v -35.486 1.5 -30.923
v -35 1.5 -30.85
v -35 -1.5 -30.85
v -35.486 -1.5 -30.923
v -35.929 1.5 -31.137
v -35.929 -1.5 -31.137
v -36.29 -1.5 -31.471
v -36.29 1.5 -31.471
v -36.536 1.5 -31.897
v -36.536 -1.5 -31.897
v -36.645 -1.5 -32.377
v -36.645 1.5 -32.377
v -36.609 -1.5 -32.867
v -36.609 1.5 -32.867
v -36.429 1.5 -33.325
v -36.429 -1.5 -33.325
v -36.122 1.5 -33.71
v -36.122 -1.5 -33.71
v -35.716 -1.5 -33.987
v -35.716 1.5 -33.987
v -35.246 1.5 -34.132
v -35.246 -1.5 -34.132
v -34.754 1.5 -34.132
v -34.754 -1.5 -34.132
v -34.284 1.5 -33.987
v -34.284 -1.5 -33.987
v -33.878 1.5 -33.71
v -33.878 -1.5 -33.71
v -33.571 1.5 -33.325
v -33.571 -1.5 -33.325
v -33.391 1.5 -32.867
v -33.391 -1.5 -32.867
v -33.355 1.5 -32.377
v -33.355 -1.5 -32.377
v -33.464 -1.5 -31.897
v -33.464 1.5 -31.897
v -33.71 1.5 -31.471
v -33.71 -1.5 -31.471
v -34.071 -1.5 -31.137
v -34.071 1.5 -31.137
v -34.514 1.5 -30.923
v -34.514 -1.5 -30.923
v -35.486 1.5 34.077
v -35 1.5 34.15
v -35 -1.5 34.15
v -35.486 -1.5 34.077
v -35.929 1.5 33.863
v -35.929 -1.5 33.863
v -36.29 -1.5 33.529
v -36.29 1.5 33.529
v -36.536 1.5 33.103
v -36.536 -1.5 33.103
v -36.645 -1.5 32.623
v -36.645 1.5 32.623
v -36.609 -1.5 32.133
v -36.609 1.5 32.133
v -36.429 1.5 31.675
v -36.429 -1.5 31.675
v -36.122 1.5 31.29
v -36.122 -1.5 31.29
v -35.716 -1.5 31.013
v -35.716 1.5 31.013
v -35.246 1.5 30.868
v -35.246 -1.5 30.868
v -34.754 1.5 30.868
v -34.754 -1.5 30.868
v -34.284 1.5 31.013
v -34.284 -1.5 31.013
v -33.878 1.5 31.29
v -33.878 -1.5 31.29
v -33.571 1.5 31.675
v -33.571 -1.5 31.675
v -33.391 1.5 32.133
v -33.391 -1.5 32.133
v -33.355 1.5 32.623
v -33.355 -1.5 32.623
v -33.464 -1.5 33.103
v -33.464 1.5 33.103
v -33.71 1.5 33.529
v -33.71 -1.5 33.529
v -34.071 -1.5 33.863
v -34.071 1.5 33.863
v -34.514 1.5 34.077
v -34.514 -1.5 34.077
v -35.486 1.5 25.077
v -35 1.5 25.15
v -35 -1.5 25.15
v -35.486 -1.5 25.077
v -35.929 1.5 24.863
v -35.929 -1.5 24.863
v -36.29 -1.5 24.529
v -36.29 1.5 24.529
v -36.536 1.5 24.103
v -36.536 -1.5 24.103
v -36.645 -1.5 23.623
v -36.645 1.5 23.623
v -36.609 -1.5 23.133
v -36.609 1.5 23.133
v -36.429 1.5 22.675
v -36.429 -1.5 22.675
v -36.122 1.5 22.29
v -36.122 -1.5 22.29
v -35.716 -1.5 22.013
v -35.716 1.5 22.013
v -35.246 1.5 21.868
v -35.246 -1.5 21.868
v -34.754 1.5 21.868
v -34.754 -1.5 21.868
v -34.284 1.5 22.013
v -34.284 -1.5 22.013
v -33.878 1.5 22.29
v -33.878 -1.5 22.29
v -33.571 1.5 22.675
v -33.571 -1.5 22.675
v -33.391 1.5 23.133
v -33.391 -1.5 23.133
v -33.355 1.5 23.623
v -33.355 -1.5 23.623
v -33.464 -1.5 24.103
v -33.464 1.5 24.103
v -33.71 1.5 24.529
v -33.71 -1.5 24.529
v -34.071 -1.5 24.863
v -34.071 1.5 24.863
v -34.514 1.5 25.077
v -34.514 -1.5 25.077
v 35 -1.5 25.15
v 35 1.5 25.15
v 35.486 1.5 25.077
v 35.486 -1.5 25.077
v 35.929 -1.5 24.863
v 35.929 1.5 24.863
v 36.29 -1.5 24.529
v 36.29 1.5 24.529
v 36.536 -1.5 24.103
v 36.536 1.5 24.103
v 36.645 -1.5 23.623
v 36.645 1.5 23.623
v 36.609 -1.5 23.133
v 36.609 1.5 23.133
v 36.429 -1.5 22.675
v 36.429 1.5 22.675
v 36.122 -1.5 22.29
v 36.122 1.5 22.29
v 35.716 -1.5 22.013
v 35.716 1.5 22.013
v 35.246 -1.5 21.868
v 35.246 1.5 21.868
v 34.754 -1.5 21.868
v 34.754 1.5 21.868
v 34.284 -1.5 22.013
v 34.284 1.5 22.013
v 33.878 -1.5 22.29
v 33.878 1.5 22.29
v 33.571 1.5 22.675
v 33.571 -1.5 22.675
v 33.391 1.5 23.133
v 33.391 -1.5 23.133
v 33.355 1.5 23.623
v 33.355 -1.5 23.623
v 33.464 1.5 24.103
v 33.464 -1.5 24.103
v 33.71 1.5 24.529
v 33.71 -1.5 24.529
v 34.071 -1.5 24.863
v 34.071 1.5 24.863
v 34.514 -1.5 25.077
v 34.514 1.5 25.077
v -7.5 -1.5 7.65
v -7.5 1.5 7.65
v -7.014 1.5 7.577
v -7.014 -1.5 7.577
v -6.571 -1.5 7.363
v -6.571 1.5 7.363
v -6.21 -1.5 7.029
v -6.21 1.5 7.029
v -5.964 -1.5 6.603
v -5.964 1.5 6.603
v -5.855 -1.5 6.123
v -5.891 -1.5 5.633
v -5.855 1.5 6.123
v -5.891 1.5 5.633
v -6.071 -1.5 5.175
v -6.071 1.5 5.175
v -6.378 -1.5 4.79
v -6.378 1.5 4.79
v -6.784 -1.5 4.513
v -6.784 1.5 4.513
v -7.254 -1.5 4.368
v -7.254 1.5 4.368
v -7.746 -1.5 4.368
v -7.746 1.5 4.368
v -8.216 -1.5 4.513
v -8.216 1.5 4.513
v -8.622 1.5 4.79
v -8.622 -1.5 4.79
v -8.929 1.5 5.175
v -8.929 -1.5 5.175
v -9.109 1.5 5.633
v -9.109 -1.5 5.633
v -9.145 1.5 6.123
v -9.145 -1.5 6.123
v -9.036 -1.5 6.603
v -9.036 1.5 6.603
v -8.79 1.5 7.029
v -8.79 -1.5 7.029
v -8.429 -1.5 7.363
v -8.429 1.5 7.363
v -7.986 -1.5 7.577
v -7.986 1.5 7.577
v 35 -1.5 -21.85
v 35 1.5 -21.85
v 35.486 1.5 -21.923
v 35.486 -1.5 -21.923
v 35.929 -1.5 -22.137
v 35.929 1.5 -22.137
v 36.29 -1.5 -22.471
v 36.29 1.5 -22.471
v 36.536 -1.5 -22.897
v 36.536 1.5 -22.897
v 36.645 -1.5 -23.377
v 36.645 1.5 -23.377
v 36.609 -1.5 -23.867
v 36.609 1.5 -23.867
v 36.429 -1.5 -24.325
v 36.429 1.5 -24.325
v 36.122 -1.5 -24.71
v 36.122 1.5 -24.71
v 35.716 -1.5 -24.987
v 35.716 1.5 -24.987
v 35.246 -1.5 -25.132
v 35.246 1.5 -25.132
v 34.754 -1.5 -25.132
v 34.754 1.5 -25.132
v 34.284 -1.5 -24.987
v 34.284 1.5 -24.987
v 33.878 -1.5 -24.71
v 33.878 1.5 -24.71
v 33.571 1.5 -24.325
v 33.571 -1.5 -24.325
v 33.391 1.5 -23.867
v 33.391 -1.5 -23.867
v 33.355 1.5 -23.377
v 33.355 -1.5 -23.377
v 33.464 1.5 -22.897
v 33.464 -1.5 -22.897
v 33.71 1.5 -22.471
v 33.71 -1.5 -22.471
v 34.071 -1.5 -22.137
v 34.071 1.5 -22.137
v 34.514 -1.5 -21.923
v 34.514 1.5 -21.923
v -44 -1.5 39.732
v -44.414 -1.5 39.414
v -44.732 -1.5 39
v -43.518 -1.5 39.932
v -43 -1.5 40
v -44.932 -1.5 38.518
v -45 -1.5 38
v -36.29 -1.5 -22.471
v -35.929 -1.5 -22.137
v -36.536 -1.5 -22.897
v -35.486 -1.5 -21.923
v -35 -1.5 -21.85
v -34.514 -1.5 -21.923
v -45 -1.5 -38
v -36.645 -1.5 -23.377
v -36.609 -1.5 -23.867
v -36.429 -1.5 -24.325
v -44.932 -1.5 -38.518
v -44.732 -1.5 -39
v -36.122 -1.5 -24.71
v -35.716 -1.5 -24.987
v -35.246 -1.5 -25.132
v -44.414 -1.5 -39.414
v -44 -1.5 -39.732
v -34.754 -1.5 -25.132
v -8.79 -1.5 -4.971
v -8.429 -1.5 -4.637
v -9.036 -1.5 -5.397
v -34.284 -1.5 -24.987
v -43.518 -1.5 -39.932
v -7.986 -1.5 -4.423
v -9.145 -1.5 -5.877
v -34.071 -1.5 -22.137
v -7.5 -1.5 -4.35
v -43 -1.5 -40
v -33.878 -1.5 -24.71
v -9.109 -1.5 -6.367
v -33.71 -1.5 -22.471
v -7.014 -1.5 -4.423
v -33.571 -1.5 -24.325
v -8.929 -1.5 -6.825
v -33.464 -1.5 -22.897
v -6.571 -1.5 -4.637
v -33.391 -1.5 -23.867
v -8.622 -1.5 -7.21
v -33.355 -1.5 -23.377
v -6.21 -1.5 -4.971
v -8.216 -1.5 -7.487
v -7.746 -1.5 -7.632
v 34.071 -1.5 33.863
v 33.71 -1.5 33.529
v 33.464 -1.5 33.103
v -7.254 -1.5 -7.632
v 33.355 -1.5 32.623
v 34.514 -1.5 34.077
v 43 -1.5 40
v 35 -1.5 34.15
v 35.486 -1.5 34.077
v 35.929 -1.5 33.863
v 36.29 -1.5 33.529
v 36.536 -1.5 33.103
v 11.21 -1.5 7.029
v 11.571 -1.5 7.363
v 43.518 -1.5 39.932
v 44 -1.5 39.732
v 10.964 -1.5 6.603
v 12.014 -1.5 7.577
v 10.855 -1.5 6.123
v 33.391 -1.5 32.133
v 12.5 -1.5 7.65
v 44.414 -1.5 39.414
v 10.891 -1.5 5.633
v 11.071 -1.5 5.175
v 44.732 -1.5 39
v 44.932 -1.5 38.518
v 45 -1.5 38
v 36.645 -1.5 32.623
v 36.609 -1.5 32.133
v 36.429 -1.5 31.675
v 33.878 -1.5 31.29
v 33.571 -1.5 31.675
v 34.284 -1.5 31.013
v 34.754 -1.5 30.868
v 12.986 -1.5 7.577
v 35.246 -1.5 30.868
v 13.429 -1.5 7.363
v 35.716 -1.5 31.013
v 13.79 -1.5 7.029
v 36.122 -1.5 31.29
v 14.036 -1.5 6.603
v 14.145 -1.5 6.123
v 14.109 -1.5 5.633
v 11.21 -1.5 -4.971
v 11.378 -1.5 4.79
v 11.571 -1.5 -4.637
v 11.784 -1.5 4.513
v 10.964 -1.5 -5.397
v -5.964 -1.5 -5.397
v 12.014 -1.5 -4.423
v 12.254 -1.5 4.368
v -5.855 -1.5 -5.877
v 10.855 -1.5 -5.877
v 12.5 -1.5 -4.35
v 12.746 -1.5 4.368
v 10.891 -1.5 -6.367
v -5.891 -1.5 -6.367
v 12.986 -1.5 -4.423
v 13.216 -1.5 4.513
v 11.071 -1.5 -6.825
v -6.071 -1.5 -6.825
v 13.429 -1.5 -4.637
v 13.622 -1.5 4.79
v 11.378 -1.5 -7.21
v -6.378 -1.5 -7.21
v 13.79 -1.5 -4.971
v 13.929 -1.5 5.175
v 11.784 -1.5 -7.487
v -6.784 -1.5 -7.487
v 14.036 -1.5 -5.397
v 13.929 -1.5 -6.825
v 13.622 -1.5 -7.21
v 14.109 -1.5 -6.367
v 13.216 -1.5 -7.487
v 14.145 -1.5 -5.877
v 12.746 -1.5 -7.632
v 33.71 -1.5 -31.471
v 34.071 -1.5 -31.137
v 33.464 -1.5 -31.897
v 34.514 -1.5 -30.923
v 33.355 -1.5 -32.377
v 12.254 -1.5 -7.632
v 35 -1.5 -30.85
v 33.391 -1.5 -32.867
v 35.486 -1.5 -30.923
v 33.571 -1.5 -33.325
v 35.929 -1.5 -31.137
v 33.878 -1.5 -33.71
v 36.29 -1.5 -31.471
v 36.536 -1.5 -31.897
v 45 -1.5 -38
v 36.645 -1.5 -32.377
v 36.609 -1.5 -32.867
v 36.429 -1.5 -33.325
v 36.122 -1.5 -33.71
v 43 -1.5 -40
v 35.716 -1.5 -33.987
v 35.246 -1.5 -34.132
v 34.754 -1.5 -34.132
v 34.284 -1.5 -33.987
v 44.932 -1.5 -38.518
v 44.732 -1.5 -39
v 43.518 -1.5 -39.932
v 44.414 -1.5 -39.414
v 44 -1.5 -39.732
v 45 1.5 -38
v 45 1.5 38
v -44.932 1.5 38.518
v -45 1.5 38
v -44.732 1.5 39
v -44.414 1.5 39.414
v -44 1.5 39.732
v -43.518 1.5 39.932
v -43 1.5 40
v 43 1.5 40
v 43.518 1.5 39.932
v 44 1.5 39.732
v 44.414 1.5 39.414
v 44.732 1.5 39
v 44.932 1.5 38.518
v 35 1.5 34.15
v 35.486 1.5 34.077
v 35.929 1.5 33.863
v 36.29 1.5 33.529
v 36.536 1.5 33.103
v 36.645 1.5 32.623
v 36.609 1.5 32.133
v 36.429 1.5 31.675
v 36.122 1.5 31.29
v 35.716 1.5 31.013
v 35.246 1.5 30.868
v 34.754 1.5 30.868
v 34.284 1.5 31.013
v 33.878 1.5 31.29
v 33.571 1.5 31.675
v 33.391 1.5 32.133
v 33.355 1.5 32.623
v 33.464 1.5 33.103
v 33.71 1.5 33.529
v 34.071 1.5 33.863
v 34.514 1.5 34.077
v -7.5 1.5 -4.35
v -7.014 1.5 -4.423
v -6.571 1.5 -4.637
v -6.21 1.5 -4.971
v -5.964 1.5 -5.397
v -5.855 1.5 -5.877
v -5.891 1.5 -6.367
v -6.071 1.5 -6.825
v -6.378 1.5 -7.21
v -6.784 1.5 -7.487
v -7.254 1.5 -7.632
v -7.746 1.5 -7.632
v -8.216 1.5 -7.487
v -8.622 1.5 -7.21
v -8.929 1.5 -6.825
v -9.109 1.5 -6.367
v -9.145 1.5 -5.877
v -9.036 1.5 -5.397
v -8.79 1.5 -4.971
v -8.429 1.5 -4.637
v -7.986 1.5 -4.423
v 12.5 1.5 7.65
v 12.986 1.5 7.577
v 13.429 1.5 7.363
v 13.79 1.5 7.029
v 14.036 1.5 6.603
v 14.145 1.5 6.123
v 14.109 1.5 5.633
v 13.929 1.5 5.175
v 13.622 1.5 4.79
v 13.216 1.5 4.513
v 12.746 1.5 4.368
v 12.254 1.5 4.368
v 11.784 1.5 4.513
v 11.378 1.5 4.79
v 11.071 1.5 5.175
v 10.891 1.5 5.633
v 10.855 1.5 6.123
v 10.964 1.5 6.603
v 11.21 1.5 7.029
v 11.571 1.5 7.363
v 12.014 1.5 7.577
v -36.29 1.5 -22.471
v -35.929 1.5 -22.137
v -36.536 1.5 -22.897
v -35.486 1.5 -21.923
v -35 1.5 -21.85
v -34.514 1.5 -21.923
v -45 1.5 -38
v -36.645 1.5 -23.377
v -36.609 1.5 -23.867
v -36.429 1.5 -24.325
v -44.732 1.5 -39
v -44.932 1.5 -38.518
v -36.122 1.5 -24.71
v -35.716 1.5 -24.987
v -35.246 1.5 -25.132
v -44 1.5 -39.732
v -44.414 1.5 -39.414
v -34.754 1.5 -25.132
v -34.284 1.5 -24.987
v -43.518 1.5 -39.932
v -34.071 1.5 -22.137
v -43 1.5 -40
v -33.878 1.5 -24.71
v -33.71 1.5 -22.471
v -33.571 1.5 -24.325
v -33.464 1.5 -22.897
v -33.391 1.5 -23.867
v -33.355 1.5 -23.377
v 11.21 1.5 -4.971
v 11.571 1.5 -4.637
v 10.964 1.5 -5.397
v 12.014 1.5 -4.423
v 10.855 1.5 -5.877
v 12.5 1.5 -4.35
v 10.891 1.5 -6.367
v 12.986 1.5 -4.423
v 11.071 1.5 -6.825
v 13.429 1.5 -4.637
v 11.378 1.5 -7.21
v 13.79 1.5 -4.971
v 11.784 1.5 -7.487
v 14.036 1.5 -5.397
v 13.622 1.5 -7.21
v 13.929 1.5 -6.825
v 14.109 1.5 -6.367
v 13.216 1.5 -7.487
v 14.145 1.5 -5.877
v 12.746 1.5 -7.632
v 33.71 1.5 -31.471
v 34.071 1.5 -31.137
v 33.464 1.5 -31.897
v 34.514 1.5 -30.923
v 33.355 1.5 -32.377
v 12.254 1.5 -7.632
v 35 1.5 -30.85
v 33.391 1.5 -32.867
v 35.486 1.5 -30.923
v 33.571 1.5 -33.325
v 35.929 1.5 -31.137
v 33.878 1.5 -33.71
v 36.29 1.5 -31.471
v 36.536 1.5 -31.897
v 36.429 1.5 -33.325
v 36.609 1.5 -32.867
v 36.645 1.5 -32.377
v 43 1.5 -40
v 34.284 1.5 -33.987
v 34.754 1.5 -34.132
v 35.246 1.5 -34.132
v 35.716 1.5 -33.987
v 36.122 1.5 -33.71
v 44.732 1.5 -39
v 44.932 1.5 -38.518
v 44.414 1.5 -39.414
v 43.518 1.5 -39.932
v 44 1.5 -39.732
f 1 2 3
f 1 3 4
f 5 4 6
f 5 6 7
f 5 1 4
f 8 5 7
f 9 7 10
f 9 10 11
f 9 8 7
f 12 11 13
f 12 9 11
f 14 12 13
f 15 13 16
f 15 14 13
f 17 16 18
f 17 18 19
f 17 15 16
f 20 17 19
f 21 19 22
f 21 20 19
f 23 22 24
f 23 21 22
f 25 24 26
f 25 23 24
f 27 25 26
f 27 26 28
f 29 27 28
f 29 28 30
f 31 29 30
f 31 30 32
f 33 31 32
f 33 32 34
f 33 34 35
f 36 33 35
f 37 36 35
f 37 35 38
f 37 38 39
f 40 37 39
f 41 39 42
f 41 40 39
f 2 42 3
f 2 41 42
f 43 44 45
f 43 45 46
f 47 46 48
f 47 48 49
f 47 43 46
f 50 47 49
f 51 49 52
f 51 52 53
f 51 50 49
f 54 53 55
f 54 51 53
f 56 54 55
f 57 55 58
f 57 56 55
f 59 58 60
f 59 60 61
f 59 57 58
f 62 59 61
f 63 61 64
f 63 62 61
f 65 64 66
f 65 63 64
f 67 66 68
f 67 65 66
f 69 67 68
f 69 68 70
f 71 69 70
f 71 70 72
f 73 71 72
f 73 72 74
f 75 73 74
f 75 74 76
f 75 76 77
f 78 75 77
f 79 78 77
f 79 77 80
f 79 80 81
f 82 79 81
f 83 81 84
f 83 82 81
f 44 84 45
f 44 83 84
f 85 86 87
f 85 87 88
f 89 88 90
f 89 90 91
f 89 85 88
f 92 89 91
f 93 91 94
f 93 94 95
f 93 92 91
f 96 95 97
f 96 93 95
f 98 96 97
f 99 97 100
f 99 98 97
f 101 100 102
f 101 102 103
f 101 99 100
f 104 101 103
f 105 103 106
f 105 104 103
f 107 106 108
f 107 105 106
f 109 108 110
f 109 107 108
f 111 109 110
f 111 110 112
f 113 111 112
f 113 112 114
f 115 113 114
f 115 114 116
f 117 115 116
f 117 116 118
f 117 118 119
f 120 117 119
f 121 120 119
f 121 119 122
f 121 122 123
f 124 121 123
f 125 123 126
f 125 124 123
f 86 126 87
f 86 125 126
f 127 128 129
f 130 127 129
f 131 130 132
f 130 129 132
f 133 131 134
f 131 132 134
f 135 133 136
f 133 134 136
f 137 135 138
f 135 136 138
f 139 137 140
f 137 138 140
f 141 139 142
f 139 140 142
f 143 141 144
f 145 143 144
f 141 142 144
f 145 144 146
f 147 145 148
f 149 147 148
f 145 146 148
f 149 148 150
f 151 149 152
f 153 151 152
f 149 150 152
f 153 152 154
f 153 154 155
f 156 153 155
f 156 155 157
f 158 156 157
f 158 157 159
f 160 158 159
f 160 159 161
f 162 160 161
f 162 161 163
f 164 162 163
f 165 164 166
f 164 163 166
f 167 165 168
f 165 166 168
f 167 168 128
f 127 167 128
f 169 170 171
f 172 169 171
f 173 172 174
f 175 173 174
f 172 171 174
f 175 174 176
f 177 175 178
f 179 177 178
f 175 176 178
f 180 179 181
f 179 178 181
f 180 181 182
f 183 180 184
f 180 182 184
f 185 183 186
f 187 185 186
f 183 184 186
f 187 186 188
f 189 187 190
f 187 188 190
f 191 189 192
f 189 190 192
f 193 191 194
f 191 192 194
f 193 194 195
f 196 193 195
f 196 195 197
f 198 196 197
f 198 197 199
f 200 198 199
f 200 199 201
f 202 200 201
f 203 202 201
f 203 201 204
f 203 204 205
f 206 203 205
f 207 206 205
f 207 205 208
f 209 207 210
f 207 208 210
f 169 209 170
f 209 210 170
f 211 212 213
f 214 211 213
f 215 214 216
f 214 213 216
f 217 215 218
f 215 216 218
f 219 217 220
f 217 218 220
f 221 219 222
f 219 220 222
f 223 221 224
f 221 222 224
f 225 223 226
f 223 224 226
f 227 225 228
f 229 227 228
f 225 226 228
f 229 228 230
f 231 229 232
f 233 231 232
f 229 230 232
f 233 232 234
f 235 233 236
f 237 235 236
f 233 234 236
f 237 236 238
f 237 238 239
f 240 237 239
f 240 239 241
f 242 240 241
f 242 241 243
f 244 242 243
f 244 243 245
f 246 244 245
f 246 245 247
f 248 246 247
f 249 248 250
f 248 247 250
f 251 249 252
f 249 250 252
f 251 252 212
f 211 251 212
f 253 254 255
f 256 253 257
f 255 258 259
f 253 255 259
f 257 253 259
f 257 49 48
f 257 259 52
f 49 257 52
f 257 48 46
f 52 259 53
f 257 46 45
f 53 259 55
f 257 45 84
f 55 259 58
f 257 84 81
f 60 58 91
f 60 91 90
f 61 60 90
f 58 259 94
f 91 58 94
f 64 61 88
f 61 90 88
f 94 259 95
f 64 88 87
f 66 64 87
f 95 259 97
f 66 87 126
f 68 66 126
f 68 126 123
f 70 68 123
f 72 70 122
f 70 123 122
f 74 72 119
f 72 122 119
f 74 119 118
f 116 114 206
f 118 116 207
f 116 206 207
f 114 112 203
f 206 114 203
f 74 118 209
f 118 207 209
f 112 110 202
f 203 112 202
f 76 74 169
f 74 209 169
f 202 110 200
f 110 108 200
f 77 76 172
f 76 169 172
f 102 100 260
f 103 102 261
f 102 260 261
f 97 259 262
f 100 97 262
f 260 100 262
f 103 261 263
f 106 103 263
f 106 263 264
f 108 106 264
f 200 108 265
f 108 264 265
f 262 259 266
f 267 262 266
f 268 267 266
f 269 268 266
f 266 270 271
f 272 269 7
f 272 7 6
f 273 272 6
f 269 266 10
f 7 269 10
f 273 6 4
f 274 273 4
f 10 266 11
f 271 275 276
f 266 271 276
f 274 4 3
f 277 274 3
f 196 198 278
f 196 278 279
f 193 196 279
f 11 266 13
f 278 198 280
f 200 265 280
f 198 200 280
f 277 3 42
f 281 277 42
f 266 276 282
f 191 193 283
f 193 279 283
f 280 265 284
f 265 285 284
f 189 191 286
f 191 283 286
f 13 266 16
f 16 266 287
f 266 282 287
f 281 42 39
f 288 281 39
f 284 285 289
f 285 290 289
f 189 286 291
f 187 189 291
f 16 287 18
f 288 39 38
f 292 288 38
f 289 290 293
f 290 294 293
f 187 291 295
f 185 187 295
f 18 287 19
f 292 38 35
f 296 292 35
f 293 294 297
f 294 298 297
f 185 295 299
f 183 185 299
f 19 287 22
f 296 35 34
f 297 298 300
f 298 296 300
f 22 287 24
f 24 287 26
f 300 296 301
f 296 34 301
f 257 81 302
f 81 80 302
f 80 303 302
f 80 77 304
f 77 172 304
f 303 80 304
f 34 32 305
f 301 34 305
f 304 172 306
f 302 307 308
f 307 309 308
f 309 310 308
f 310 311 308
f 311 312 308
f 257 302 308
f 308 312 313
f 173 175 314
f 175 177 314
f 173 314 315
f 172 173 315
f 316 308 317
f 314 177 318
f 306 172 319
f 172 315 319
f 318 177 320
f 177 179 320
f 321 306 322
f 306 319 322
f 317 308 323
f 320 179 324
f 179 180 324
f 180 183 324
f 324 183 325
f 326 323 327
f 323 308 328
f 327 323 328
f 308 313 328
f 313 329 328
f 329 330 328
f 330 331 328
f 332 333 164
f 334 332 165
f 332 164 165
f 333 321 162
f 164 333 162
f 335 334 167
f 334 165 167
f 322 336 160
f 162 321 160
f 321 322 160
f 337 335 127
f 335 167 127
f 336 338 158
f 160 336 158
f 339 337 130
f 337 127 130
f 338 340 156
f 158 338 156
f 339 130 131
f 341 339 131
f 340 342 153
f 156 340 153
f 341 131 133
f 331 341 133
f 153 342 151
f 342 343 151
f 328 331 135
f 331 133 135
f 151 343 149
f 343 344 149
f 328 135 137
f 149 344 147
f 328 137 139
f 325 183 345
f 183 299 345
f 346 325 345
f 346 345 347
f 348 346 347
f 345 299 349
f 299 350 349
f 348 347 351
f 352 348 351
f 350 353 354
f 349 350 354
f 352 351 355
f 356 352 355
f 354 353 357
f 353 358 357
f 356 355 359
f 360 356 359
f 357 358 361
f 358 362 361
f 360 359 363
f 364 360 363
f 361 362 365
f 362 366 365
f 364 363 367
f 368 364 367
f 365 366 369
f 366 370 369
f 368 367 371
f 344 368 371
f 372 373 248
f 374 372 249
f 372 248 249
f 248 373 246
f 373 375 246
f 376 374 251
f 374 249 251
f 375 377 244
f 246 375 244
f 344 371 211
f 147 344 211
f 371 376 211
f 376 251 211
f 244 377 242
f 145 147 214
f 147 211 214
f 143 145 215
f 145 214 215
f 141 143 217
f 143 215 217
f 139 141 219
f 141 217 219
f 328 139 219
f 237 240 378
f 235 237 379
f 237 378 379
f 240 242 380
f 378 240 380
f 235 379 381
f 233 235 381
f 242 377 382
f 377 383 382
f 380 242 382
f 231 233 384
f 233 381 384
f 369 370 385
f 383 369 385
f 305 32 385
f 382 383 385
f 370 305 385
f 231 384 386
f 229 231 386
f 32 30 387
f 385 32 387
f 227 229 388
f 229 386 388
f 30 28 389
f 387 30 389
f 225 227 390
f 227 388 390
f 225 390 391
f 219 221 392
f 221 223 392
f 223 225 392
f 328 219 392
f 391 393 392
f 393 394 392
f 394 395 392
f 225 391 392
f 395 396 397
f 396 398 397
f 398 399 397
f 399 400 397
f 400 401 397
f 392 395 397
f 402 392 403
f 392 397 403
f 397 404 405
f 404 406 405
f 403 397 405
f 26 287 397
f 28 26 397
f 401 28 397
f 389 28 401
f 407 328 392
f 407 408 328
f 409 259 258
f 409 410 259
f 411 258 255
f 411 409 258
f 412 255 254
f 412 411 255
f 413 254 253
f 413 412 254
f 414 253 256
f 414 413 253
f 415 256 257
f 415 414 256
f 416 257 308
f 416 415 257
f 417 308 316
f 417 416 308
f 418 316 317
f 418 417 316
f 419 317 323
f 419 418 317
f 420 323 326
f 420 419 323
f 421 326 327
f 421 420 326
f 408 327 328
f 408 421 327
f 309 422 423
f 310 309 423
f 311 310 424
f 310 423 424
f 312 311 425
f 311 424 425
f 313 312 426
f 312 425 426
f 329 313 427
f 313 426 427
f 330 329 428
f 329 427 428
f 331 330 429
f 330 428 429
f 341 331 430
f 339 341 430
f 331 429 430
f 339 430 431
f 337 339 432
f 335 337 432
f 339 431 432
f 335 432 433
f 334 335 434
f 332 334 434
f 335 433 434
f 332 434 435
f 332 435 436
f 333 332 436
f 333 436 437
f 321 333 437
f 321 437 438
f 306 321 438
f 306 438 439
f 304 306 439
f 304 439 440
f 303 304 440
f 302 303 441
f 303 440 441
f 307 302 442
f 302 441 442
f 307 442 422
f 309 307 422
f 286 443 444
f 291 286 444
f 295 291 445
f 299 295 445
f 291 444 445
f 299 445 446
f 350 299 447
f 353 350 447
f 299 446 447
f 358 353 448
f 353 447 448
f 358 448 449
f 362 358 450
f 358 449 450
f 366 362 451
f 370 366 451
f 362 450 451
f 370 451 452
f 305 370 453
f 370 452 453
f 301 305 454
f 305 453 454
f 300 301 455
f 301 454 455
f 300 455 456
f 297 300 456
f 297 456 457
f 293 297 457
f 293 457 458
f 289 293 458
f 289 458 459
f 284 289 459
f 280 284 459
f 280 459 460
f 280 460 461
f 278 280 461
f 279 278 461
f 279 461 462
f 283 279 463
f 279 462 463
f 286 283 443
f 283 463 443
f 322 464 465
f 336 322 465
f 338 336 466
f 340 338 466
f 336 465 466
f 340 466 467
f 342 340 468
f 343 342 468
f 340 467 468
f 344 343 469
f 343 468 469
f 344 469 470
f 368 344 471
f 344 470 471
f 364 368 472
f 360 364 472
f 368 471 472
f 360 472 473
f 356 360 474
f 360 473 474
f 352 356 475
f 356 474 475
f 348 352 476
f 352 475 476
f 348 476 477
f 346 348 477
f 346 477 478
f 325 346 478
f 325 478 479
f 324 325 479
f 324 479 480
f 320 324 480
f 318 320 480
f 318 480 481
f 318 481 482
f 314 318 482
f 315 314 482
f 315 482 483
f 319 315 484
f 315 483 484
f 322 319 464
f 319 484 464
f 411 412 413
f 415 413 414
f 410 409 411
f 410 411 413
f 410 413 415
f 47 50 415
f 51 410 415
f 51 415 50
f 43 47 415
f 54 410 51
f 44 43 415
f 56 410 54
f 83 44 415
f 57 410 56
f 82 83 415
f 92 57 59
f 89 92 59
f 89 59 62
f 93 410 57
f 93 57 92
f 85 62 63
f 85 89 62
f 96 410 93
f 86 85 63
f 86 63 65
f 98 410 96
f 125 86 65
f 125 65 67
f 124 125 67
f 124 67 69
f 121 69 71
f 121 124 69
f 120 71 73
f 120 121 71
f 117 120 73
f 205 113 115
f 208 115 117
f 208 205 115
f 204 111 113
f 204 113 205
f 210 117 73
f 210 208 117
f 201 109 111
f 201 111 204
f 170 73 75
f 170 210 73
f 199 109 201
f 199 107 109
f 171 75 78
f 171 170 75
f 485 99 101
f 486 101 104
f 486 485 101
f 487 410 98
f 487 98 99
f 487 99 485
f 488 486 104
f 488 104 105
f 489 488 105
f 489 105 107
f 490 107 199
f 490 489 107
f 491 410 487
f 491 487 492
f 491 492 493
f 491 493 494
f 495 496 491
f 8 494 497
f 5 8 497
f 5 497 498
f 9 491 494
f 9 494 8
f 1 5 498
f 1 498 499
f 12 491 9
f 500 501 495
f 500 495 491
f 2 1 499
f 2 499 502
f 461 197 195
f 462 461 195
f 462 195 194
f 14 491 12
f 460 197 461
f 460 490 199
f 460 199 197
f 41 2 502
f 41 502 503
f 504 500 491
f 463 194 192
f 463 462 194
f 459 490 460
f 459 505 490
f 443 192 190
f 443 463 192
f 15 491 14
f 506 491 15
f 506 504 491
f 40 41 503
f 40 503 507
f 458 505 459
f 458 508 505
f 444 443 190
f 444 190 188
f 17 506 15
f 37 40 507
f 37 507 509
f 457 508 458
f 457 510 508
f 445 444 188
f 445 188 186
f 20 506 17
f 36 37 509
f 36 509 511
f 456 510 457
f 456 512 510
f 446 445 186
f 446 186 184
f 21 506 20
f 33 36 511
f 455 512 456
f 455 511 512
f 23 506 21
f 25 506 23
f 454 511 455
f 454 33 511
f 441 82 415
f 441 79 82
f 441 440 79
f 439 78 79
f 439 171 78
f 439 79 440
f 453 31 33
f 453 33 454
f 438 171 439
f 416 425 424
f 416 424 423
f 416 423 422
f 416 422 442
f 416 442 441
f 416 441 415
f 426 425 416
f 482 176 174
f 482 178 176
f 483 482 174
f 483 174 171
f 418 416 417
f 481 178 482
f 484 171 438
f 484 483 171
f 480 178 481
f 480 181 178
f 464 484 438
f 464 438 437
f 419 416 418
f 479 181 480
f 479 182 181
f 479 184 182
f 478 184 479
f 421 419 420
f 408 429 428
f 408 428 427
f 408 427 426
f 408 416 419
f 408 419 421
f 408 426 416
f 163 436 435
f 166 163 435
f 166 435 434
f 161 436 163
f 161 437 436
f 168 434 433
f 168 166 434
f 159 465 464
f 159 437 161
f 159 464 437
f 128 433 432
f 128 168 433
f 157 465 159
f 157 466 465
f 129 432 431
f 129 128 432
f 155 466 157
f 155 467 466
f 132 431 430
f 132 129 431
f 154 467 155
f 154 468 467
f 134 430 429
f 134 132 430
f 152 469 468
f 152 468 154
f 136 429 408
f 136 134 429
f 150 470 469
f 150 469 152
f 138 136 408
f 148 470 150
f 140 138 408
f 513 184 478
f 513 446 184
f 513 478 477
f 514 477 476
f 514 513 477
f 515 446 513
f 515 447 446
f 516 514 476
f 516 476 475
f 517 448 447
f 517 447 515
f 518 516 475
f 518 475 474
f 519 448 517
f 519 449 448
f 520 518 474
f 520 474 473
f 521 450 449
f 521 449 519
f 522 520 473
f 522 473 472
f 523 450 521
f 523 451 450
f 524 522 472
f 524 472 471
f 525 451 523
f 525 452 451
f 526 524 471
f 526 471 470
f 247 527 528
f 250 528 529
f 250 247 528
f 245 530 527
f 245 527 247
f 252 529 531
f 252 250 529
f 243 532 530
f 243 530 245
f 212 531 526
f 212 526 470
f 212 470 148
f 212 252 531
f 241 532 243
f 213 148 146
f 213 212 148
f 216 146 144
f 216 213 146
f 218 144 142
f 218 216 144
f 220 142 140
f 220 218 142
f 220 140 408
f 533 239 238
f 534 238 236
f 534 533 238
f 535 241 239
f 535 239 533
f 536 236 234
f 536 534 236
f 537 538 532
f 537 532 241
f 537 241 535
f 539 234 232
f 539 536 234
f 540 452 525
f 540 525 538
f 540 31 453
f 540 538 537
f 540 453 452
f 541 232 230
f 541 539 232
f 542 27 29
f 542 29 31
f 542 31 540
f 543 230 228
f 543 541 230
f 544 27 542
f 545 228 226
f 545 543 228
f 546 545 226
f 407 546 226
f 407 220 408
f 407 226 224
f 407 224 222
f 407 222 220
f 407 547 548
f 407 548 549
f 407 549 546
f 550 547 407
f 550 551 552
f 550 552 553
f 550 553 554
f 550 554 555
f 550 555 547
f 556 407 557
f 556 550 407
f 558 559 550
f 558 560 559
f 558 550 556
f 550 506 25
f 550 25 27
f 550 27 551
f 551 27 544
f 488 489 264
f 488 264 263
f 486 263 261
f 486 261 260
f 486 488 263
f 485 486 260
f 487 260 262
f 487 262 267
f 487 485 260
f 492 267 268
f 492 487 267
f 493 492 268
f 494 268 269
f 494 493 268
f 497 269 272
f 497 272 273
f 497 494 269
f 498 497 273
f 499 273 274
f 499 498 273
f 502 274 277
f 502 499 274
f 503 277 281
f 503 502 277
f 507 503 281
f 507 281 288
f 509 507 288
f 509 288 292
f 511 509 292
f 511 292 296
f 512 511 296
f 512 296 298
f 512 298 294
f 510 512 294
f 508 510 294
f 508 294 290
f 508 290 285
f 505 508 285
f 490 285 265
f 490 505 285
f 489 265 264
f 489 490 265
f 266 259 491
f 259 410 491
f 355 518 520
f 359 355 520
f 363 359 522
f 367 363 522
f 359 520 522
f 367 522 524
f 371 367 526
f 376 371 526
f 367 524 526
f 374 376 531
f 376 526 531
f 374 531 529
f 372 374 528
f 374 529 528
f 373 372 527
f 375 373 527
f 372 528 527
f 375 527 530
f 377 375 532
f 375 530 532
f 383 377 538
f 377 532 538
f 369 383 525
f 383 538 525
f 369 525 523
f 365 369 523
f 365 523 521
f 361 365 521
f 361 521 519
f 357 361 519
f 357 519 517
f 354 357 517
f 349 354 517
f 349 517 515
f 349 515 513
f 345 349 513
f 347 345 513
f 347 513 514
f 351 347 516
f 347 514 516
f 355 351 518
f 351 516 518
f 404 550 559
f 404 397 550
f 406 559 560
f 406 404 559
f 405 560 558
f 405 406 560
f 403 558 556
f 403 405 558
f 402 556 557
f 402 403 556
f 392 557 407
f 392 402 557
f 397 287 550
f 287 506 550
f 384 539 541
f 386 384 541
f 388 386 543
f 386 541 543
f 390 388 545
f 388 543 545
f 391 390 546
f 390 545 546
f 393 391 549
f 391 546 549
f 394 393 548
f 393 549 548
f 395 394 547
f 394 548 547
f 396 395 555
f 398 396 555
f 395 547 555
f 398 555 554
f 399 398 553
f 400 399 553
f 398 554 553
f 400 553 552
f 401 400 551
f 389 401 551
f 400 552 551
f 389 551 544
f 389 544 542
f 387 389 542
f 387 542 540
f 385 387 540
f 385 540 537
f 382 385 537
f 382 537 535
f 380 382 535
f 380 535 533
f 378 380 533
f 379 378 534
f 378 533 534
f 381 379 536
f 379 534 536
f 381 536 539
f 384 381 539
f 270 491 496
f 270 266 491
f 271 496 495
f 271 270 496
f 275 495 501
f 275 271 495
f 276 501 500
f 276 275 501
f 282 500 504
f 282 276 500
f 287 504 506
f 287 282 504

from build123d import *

# Parameters (mm, degrees)
SKETCH_1_W          = 90
SKETCH_1_H          = 80
EXTRUDE_1_DEPTH     = 1.5
SKETCH_2_R          = 1.65
CUT_EXTRUDE_1_DEPTH = 3
FILLET_1_R          = 2
SKETCH_3_R          = 1.65
CUT_EXTRUDE_2_DEPTH = 3


with BuildPart() as part:
    # 草图1 → 凸台-拉伸1 (new, symmetric)
    with BuildSketch(Plane(origin=(0, 0, 0), x_dir=(1, 0, 0), z_dir=(0, 1, 0))):
        Rectangle(SKETCH_1_W, SKETCH_1_H)
    extrude(amount=EXTRUDE_1_DEPTH, both=True)

    # 草图2 → 切除-拉伸1 (cut)
    with BuildSketch(Plane(origin=(0, 1.5, 0), x_dir=(1, 0, 0), z_dir=(0, 1, 0))):
        with Locations(Location((12.5, 6, 0), (0, 0, 270))):
            Circle(SKETCH_2_R)
        with Locations(Location((-7.5, 6, 0), (0, 0, 270))):
            Circle(SKETCH_2_R)
        with Locations(Location((-7.5, -6, 0), (0, 0, 270))):
            Circle(SKETCH_2_R)
        with Locations(Location((12.5, -6, 0), (0, 0, 270))):
            Circle(SKETCH_2_R)
    extrude(amount=-CUT_EXTRUDE_1_DEPTH, mode=Mode.SUBTRACT)

    # 圆角1
    fillet_1_edges = [part.edges().sort_by_distance(p)[0] for p in [
        (45, 0, 40),
        (-45, 0, 40),
        (-45, 0, -40),
        (45, 0, -40),
    ]]
    fillet(fillet_1_edges, radius=FILLET_1_R)

    # 草图3 → 切除-拉伸2 (cut)
    with BuildSketch(Plane(origin=(0, 1.5, 0), x_dir=(1, 0, 0), z_dir=(0, 1, 0))):
        with Locations(Location((35, 32.5, 0), (0, 0, 270))):
            Circle(SKETCH_3_R)
        with Locations(Location((35, 23.5, 0), (0, 0, 270))):
            Circle(SKETCH_3_R)
        with Locations(Location((35, -23.5, 0), (0, 0, 270))):
            Circle(SKETCH_3_R)
        with Locations(Location((35, -32.5, 0), (0, 0, 270))):
            Circle(SKETCH_3_R)
    cut_extrude_2 = extrude(amount=-CUT_EXTRUDE_2_DEPTH, mode=Mode.SUBTRACT)

    # 镜向1: 切除-拉伸2 across plane
    add(cut_extrude_2.mirror(Plane(origin=(0, 0, 0), x_dir=(0, 0, 1), z_dir=(1, 0, 0))), mode=Mode.SUBTRACT)

    # 镜向1 at the second plane: 切除-拉伸2 across plane
    add(cut_extrude_2.mirror(Plane.XY), mode=Mode.SUBTRACT)


solid = part.part
